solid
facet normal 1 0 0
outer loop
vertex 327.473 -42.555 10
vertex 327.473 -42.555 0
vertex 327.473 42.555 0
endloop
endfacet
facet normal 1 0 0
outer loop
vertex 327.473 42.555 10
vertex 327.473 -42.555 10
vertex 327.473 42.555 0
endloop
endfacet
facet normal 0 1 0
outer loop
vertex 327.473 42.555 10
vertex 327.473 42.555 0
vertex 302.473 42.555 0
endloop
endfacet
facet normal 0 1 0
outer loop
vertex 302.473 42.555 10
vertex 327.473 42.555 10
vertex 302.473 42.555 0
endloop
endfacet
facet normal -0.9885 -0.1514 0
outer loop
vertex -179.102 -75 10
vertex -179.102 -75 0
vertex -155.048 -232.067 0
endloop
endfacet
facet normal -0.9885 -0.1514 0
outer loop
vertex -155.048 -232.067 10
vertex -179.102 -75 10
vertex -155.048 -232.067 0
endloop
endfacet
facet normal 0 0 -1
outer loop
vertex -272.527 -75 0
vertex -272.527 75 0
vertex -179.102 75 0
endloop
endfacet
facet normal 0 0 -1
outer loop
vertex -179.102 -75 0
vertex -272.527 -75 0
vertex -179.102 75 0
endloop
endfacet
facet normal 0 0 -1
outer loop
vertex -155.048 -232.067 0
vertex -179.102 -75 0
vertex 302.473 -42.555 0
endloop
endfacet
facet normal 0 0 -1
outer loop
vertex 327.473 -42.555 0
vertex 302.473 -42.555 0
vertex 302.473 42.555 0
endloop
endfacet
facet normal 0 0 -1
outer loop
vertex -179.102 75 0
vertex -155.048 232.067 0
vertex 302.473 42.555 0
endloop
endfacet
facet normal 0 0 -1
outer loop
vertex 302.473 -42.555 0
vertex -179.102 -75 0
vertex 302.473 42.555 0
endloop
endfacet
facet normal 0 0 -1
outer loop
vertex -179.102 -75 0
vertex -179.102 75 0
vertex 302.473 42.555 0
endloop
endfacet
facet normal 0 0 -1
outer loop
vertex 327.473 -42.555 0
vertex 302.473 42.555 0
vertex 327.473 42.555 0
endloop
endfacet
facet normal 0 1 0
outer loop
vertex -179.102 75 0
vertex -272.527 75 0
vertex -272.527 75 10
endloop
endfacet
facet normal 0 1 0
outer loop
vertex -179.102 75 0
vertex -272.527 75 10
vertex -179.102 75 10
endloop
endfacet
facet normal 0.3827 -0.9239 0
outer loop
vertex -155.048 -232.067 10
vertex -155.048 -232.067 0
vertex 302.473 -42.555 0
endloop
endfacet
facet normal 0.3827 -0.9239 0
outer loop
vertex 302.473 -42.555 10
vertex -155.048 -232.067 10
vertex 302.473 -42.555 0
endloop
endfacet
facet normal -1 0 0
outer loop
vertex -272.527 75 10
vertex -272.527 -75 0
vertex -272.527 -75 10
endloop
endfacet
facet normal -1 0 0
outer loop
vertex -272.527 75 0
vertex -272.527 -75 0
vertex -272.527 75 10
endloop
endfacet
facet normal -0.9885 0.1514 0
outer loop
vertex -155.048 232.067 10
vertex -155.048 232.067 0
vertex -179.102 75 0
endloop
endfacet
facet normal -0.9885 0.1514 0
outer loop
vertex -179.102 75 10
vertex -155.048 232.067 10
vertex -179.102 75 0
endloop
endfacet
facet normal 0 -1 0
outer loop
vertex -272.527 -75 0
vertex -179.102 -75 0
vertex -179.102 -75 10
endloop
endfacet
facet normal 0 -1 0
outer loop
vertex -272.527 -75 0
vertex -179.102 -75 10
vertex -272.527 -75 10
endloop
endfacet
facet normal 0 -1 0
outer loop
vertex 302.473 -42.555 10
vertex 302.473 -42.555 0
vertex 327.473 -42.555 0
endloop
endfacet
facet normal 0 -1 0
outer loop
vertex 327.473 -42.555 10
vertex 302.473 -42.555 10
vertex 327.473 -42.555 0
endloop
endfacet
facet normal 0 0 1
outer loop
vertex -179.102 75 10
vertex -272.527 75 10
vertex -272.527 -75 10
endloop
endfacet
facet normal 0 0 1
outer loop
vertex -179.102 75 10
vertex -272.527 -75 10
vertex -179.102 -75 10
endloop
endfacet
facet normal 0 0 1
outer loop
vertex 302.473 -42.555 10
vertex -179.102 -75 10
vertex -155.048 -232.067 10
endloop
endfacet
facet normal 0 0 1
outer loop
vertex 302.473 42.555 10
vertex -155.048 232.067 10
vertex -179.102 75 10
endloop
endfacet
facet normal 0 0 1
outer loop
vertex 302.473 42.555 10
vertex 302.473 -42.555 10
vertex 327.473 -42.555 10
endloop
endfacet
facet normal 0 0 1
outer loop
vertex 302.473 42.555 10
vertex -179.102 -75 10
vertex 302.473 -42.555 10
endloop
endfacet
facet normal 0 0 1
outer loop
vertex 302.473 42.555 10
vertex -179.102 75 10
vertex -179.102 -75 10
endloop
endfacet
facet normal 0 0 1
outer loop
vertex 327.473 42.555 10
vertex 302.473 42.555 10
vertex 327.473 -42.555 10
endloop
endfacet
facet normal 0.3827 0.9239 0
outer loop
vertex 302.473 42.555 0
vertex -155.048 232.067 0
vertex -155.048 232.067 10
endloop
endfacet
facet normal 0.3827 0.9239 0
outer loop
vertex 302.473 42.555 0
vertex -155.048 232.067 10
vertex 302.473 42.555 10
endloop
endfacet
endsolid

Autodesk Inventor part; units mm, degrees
ref_plane "YZ Plane" through (0, 0, 0) normal (1, 0, 0) x (0, 1, 0)
ref_plane "XZ Plane" through (0, 0, 0) normal (0, 1, 0) x (-1, 0, 0)
ref_plane "Work Plane1" through (0, 0, 0) normal (0, 0, 1) x (1, 0, 0)
sketch "Sketch1" plane through (0, 0, 0) normal (0, 0, 1) x (1, 0, 0)
  line L0 (-155.0476, 232.0666) -> (-62.9335, 193.9117) construction
  line L1 (177.2752, 94.414) -> (270.7225, 55.7069) construction
  line L2 (177.2752, -94.414) -> (270.7225, -55.7069) construction
  line L3 (-155.0476, -232.0666) -> (-62.9335, -193.9117) construction
  line L4 (-192.4394, 0.4878) -> (-152.8157, 221.8622) construction
  line L5 (-152.8157, -221.8622) -> (-192.4394, -0.4878) construction
  line L6 (302.4733, 35) -> (302.4733, 38) construction
  line L7 (302.4733, -38) -> (302.4733, -35) construction
  line L8 (-254.8213, 5) -> (-254.8213, -5) construction
  line L9 (-272.5267, 75) -> (-179.1025, 75)
  line L10 (-179.1025, 75) -> (-179.1025, -75)
  line L11 (-179.1025, -75) -> (-272.5267, -75)
  line L12 (-272.5267, -75) -> (-272.5267, 75)
  line L13 (327.4733, 53.8478) -> (327.4733, 38) construction
  line L14 (-272.5267, 5) -> (-272.5267, -5) construction
  line L15 (327.4733, 42.5553) -> (302.4733, 42.5553)
  line L16 (302.4733, 42.5553) -> (302.4733, -42.5553)
  line L17 (302.4733, -42.5553) -> (327.4733, -42.5553)
  line L18 (327.4733, -42.5553) -> (327.4733, 42.5553)
  line L19 (-155.0476, 232.0666) -> (302.4733, 42.5553)
  line L20 (-155.0476, -232.0666) -> (302.4733, -42.5553)
  line L21 (-155.0476, 232.0666) -> (-179.1025, 75)
  line L22 (-179.1025, -75) -> (-155.0476, -232.0666)
  point P0 (0, 0)
  point P1 (-151.2693, 230.5016)
  point P2 (-151.2693, -230.5016)
  dimension "d0" = 150
extrude "Extrusion1" add sketch "Sketch1" along normal blind 10
properties part number "internalSupportBottom1" material "Wood (Birch)"
